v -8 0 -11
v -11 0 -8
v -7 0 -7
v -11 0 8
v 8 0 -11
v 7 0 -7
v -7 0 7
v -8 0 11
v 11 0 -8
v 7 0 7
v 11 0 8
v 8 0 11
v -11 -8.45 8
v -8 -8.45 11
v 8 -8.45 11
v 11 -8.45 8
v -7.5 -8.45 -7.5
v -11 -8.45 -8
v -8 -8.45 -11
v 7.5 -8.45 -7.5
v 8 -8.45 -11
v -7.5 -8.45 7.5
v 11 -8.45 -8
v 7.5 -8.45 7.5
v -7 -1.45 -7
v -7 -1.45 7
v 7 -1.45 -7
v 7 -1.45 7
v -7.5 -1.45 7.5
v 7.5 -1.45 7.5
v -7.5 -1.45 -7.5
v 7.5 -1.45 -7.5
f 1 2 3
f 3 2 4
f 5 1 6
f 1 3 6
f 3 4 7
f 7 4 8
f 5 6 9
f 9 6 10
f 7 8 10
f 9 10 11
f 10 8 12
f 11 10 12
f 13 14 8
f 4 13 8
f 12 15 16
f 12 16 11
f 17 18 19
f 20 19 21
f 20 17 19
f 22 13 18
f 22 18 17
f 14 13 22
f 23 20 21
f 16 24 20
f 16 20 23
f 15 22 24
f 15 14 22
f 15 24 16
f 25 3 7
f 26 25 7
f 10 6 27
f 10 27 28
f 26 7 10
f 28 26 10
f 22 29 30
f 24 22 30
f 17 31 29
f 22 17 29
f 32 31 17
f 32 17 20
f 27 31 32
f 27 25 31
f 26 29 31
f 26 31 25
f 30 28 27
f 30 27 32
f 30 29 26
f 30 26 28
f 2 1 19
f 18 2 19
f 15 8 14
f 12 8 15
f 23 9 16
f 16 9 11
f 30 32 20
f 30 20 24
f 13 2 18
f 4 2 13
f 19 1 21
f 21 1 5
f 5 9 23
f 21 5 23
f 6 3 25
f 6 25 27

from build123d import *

# Parameters (mm, degrees)
F0_W     = 22
F0_H     = 22
F0_W_2   = 14
F0_H_2   = 14
F1_DEPTH = 1.45
F2_W     = 22
F2_H     = 22
F2_W_2   = 15
F2_H_2   = 15
F3_DEPTH = 7
F4_SIZE  = 3


with BuildPart() as f1:
    # F0 (on Front) → F1 (new body)
    with BuildSketch(Plane.XZ):
        Rectangle(F0_W, F0_H)
        Rectangle(F0_W_2, F0_H_2, mode=Mode.SUBTRACT)
    extrude(amount=F1_DEPTH)

    # F2 (on face) → F3 (join)
    with BuildSketch(Plane.XZ.offset(1.45)):
        Rectangle(F2_W, F2_H)
        Rectangle(F2_W_2, F2_H_2, mode=Mode.SUBTRACT)
    extrude(amount=F3_DEPTH)

    # F4
    f4_edges = [f1.edges().sort_by_distance(p)[0] for p in [
        (-11, -4.225, 11),
        (11, -4.225, 11),
        (11, -4.225, -11),
        (-11, -4.225, -11),
    ]]
    chamfer(f4_edges, length=F4_SIZE)


solid = f1.part
